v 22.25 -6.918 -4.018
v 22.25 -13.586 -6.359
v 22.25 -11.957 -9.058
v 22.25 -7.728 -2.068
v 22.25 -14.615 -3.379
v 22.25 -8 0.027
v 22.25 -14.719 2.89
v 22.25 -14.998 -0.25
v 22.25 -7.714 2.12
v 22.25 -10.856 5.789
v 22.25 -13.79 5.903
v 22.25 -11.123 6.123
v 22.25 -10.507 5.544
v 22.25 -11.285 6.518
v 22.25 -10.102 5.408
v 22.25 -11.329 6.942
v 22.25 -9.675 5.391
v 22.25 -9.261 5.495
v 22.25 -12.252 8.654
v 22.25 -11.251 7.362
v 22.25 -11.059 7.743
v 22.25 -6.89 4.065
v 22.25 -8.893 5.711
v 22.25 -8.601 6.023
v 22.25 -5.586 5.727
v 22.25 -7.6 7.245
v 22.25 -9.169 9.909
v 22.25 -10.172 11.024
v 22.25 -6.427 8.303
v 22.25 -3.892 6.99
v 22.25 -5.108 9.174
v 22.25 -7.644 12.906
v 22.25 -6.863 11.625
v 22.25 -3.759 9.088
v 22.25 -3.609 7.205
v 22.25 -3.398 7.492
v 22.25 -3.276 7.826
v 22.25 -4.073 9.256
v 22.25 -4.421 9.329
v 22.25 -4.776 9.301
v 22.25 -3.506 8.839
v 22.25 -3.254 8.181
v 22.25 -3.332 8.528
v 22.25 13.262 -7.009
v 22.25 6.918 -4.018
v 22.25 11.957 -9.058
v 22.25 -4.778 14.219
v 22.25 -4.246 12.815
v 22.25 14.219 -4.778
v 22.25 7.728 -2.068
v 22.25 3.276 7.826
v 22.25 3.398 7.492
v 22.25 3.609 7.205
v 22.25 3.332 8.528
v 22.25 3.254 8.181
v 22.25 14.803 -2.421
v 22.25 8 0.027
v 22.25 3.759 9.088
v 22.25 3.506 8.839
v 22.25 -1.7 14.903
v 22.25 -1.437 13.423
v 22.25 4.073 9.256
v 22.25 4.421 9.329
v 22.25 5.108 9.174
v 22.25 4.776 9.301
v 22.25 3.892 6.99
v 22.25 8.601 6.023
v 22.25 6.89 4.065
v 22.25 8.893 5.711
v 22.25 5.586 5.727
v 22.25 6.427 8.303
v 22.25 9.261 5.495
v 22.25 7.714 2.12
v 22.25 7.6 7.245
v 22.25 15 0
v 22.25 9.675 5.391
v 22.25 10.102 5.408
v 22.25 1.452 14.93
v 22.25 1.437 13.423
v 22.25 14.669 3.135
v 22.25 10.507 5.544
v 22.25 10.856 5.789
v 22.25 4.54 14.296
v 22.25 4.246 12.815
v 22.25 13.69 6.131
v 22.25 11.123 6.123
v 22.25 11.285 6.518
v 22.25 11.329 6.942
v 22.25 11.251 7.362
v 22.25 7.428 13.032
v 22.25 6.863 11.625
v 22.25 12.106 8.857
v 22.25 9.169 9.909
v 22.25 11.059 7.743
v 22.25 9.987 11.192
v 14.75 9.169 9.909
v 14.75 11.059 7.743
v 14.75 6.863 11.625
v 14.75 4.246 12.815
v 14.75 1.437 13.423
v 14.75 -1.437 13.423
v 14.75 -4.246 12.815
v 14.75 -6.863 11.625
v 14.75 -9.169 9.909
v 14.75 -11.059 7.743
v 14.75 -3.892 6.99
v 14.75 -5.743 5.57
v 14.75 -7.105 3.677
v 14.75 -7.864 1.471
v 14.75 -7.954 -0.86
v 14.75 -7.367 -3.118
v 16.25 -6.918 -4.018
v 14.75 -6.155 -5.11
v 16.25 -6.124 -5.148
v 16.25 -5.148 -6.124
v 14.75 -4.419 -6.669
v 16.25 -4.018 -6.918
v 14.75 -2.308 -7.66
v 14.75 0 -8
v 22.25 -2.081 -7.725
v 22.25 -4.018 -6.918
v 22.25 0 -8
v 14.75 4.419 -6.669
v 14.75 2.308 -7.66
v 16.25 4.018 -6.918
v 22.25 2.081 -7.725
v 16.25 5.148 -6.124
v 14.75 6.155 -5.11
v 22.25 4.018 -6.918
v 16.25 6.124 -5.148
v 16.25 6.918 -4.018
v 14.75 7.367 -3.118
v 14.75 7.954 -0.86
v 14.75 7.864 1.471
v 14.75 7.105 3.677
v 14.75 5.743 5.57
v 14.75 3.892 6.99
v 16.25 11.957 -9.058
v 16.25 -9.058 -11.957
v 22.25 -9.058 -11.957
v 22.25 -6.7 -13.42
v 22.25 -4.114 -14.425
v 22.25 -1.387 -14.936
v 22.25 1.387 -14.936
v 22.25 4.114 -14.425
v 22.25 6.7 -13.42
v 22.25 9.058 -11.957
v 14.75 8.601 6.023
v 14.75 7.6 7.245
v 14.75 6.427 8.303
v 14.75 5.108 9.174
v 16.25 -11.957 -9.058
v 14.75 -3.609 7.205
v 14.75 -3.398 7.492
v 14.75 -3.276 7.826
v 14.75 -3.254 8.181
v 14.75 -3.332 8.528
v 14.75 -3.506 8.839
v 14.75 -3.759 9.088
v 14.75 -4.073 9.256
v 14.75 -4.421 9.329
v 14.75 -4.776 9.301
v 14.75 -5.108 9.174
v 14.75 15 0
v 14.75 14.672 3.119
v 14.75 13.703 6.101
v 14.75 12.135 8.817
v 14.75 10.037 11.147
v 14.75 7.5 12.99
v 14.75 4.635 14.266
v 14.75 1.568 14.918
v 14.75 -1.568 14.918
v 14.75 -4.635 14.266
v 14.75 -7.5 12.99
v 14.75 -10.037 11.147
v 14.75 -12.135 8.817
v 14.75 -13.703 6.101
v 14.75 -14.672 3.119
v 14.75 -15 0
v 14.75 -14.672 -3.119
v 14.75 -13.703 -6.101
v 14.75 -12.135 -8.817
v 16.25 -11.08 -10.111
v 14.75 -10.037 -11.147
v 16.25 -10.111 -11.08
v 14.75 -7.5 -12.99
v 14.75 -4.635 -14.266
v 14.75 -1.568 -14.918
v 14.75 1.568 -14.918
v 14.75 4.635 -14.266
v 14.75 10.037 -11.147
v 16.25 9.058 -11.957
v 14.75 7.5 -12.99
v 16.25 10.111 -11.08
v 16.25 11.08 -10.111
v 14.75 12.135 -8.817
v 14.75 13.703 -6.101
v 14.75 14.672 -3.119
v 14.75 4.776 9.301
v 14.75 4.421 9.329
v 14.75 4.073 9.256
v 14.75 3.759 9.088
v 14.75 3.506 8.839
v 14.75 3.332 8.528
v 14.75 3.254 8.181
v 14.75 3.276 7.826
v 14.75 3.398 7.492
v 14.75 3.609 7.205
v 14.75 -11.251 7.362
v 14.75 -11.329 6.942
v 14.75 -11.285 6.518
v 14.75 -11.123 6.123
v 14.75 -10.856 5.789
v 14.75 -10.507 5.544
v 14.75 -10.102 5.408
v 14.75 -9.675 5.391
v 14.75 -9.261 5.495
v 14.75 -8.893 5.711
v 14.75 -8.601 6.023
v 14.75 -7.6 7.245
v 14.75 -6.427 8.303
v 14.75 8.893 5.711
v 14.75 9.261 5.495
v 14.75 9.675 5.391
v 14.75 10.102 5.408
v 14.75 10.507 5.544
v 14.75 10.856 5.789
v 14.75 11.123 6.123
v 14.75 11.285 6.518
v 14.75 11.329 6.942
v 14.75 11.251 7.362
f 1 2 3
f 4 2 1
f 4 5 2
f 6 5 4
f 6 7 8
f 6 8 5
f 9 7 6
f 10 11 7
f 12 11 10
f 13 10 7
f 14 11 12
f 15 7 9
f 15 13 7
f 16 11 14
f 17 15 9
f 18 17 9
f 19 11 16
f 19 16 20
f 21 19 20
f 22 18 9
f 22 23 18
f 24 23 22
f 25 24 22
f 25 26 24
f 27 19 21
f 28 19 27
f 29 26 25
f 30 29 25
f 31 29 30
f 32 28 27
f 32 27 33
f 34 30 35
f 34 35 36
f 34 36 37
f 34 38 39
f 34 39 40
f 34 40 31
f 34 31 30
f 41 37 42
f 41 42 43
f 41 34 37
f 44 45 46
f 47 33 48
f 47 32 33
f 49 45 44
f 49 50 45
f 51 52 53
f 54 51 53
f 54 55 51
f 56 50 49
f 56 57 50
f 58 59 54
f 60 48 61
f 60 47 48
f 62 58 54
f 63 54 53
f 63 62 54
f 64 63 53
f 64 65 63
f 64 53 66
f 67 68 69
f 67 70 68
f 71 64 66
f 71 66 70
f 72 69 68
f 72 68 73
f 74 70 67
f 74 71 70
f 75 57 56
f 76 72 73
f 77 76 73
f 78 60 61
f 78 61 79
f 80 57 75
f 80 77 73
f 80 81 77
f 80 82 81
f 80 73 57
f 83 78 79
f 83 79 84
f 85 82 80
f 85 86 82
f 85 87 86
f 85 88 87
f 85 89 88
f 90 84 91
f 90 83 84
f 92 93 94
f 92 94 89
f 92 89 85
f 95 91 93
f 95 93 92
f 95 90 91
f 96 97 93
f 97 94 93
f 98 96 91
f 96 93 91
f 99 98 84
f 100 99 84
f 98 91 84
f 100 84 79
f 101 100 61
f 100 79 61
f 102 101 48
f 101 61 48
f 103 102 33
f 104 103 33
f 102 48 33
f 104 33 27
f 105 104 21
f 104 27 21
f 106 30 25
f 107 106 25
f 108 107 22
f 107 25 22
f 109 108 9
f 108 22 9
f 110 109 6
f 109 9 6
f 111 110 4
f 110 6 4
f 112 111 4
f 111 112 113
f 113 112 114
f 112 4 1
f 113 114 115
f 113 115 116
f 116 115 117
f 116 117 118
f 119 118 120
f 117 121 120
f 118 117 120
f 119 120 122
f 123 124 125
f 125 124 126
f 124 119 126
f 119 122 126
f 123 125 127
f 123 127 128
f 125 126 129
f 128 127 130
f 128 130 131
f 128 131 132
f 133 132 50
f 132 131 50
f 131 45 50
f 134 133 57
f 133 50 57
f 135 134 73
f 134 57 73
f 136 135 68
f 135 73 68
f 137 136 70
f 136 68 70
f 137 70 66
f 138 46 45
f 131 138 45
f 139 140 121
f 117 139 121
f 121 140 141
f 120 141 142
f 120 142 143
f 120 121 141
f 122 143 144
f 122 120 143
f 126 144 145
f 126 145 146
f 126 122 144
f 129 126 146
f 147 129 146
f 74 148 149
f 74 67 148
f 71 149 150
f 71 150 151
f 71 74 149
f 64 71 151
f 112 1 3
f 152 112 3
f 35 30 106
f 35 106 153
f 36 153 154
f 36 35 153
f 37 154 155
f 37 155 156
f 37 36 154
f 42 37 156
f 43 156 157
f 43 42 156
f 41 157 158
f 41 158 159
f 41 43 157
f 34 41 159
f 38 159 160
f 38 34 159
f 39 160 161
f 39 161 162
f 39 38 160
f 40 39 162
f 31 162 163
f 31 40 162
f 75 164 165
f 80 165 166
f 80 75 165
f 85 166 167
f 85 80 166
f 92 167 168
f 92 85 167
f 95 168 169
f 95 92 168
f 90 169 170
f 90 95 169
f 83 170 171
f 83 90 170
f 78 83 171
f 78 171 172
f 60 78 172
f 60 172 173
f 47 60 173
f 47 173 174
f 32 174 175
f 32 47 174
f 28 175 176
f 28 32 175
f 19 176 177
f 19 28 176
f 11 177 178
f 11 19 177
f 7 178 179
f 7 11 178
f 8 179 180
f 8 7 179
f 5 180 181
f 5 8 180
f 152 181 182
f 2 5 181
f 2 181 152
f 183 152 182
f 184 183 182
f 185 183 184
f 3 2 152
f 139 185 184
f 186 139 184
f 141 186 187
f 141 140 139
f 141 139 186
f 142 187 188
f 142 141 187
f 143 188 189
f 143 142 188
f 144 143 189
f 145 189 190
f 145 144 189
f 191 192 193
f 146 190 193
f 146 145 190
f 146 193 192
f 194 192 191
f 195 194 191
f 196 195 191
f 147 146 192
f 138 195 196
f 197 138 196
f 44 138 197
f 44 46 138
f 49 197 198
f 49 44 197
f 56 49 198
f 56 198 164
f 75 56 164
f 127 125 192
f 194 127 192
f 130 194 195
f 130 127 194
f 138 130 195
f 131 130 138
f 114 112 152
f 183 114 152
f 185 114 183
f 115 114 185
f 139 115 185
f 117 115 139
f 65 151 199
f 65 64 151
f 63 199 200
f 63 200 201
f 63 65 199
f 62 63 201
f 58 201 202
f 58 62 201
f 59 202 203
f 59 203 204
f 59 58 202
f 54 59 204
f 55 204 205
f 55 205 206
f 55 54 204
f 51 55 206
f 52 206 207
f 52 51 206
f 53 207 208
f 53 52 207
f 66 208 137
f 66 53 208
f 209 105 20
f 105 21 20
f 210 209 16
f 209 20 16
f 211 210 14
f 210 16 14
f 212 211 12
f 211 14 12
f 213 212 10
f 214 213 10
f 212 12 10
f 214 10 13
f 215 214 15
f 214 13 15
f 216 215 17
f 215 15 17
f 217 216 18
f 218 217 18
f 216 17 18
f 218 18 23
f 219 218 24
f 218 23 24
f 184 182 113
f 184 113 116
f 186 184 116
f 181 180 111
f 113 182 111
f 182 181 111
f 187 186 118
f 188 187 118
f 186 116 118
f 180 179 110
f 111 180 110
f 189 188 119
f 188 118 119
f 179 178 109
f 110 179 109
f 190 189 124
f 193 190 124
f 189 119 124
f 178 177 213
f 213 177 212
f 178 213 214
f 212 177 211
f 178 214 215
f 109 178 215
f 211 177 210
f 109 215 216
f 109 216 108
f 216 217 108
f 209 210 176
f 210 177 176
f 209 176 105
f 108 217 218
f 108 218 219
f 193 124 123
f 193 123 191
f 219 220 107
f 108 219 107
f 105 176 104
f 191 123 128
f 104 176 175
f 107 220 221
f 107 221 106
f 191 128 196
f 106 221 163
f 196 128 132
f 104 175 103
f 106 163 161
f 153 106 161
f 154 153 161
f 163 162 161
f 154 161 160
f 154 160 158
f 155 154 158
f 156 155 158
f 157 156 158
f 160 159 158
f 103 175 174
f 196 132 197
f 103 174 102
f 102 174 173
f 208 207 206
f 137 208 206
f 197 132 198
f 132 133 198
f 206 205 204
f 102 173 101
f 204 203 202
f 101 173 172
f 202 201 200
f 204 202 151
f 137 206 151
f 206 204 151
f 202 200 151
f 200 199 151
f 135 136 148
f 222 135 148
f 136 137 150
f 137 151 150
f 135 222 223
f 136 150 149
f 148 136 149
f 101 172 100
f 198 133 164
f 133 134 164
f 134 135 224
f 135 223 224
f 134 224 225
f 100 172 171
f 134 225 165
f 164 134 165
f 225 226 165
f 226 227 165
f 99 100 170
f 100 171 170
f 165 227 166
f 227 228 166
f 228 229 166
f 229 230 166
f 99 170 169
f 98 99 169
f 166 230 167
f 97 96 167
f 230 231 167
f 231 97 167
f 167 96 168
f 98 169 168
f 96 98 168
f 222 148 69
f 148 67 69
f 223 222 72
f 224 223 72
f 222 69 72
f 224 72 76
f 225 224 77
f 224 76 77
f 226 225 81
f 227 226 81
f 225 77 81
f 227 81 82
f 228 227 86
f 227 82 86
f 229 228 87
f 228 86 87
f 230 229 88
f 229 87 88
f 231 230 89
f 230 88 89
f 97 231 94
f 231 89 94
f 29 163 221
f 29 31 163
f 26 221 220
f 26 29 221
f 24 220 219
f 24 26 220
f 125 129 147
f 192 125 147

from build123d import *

# Parameters (mm, degrees)
SKETCH087_R             = 8
SKETCH087_R_2           = 4
PAD045_DEPTH            = 7.5
SKETCH088_R             = 6
SKETCH088_R_2           = 4
PAD046_DEPTH            = 7
SKETCH089_R             = 8
SKETCH089_R_2           = 4
PAD047_DEPTH            = 1.5
SKETCH090_R             = 2
PAD048_DEPTH            = 9
BODY031_ROLL_ANGLE      = 45
BODY031_PLACEMENT_ANGLE = 180
SKETCH091_R             = 15
PAD049_DEPTH            = 3.75
POCKET029_DEPTH         = 6
POLARPATTERN021_COUNT   = 2
POLARPATTERN021_ANGLE   = 90


with BuildPart() as polea8d:
    # Sketch087 → Pad045 (new body)
    with BuildSketch(Plane.YZ):
        Circle(SKETCH087_R)
        Circle(SKETCH087_R_2, mode=Mode.SUBTRACT)
    extrude(amount=PAD045_DEPTH)

    # Sketch088 (on Face3 of Pad045) → Pad046 (join)
    with BuildSketch(Plane(origin=(0, 0, 0), x_dir=(0, 1, 0), z_dir=(-1, 0, 0))):
        Circle(SKETCH088_R)
        Circle(SKETCH088_R_2, mode=Mode.SUBTRACT)
    extrude(amount=PAD046_DEPTH)

    # Sketch089 (on Face6 of Pad046) → Pad047 (join)
    with BuildSketch(Plane(origin=(-7, 0, 0), x_dir=(0, 1, 0), z_dir=(-1, 0, 0))):
        Circle(SKETCH089_R)
        Circle(SKETCH089_R_2, mode=Mode.SUBTRACT)
    extrude(amount=PAD047_DEPTH)

    # Sketch090 → Pad048 (join)
    with BuildSketch(Plane.XZ):
        with Locations((4, 0)):
            Circle(SKETCH090_R)
    extrude(amount=PAD048_DEPTH)


with BuildPart() as polea8d_1:
    # Body031 roll: moved
    add(polea8d.part.rotate(Axis((0, 0, 0), (1, 0, 0)), BODY031_ROLL_ANGLE))


with BuildPart() as polea8d_2:
    # Body031 placement: moved
    add(polea8d_1.part.moved(Location((22.5, 0, 0))).rotate(Axis((22.5, 0, 0), (0, 0, 1)), BODY031_PLACEMENT_ANGLE))


with BuildPart() as body034:
    # Sketch091 → Pad049 (new body, symmetric)
    with BuildSketch(Plane.YZ):
        Circle(SKETCH091_R)
        with BuildLine():
            ThreePointArc((-3.891892, 6.989505), (0, -8), (3.891892, 6.989505))
            ThreePointArc((5.108116, 9.17372), (3.407892, 8.689727), (3.891892, 6.989505))
            ThreePointArc((8.601093, 6.022558), (7.033353, 7.796277), (5.108116, 9.17372))
            ThreePointArc((8.601093, 6.022558), (10.690187, 5.654187), (11.058552, 7.743282))
            ThreePointArc((11.058552, 7.743282), (0, 13.5), (-11.058553, 7.743282))
            ThreePointArc((-11.058553, 7.743282), (-10.690189, 5.654189), (-8.601096, 6.022553))
            ThreePointArc((-5.108108, 9.173725), (-7.033352, 7.796278), (-8.601096, 6.022553))
            ThreePointArc((-3.891892, 6.989505), (-3.40789, 8.689723), (-5.108108, 9.173725))
        make_face(mode=Mode.SUBTRACT)
    extrude(amount=PAD049_DEPTH, both=True)


with BuildPart() as body034_1:
    # Body032 placement: moved
    add(body034.part.moved(Location((18.5, 0, 0))))

    # Cut005: cut polea8d
    add(polea8d_2.part, mode=Mode.SUBTRACT)

    # Sketch092 (on Face3 of BaseFeature005) → Pocket029 (cut)
    with BuildSketch(Plane.YZ.offset(22.25)):
        Polygon((4.018406, -6.917544), (9.86414, -12.763277), (12.763277, -9.86414), (6.917544, -4.018406), align=None)
    pocket029 = extrude(amount=-POCKET029_DEPTH, mode=Mode.SUBTRACT)

    # PolarPattern021: Pocket029 ×2 about axis
    polarpattern021_axis = Axis((22.25, 0, 0), (-1, 0, 0))
    for i in range(1, POLARPATTERN021_COUNT):
        add(pocket029.rotate(polarpattern021_axis, i * POLARPATTERN021_ANGLE / (POLARPATTERN021_COUNT - 1)), mode=Mode.SUBTRACT)


solid = body034_1.part
